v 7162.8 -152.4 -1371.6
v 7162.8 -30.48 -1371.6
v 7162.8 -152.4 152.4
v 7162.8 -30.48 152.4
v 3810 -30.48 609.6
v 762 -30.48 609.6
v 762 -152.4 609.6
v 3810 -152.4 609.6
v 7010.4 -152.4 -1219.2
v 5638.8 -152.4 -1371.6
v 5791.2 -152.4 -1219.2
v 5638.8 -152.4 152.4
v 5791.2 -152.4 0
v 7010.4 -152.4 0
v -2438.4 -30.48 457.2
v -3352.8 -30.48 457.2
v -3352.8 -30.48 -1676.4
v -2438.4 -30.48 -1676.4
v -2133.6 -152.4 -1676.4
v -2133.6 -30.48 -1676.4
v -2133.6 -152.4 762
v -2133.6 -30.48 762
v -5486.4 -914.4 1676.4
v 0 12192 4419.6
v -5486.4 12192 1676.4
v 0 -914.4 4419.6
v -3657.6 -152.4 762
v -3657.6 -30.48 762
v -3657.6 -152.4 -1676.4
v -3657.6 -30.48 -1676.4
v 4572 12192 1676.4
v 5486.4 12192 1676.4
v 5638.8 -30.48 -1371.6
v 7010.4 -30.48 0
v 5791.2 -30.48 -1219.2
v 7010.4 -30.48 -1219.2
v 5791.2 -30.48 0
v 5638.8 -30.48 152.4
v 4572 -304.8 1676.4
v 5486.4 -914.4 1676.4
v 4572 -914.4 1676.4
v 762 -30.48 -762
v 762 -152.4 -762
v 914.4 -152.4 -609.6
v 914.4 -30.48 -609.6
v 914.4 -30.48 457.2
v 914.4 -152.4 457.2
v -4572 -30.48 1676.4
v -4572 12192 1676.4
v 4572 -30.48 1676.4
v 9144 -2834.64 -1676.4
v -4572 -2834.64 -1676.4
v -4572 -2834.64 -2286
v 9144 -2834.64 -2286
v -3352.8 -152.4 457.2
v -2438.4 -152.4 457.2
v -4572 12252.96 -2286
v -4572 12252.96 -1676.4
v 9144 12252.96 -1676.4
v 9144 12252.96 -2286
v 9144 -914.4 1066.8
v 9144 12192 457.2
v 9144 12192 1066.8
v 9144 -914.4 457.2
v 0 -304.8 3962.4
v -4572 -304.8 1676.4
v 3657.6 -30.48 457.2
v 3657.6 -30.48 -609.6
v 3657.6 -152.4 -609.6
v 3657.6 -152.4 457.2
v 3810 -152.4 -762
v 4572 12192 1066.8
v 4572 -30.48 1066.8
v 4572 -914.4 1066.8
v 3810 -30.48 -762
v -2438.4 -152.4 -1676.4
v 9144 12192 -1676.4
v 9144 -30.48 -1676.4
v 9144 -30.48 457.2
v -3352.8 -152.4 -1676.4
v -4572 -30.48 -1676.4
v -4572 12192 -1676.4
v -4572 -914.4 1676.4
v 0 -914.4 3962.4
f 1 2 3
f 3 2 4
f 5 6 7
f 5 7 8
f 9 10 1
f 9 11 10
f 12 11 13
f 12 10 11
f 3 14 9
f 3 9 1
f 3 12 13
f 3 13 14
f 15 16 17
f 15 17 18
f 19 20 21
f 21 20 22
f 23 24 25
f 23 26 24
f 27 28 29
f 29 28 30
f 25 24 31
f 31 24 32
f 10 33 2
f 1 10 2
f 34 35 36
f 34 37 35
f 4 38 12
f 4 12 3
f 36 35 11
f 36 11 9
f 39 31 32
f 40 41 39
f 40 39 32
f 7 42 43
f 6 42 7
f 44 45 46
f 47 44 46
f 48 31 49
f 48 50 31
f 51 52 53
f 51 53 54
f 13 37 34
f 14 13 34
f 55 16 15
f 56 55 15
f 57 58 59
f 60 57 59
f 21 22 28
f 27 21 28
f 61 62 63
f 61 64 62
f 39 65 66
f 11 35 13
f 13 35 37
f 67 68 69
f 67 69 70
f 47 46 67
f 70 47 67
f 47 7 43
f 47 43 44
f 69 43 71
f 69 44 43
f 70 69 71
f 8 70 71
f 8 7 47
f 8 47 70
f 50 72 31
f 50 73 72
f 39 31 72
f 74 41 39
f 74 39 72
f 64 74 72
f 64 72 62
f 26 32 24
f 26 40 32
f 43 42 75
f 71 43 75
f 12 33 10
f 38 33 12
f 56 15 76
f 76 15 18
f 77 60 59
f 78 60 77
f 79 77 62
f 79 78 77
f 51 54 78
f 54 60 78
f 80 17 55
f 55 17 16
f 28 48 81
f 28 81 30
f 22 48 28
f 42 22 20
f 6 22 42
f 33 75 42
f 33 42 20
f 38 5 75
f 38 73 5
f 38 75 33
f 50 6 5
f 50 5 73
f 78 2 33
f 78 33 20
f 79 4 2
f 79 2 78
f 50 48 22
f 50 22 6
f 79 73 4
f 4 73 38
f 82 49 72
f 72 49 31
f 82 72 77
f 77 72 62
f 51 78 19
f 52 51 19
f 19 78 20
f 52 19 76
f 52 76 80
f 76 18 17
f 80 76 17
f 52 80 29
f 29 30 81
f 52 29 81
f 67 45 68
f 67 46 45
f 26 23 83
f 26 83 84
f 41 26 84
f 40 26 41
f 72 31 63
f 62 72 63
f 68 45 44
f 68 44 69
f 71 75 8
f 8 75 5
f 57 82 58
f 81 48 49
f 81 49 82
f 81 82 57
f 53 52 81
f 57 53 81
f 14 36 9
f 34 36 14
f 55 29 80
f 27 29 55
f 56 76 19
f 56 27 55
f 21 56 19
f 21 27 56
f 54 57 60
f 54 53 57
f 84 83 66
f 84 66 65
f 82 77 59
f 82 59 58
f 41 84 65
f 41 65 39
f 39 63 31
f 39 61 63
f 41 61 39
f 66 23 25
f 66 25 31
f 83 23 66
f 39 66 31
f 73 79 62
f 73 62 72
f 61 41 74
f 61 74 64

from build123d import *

# Parameters (mm, degrees)
F1_DEPTH      = 914.4
F1_DEPTH_BACK = 12192
F2_DEPTH      = 304.8
F2_DEPTH_BACK = 12192
F0_W          = 3048
F0_H          = 1371.6
F0_W_2        = 1524
F0_H_2        = 1524
F0_W_3        = 2743.2
F0_H_3        = 1066.8
F0_W_4        = 1219.2
F0_H_4        = 1219.2
F0_W_5        = 914.4
F0_H_5        = 2133.6
F3_DEPTH      = 30.48
F3_DEPTH_BACK = 12192
F4_DEPTH      = 152.4
F0_W_6        = 4572
F0_H_6        = 609.6
F5_DEPTH      = 2834.64
F5_DEPTH_BACK = 12252.96


# Not quite as in the source:
# - the program builds the solid bodies; features that only make, move or delete a surface that nothing else refers to are left out


with BuildPart() as f1:
    # F0 (on Front) → F1 (new body, two sides)
    with BuildSketch(Plane.XZ) as f1_sk:
        Polygon((-5486.4, 1676.4), (-4572, 1676.4), (0, 3962.4), (0, 4419.6), align=None)
        Polygon((0, 4419.6), (0, 3962.4), (4572, 1676.4), (5486.4, 1676.4), align=None)
    extrude(amount=F1_DEPTH)
    extrude(f1_sk.sketch, amount=-F1_DEPTH_BACK)



with BuildPart() as f1b:
    # F0 (on Front) → F1, piece 2 (new body, two sides)
    with BuildSketch(Plane.XZ) as f1_2_sk:
        Polygon((9144, 1066.8), (4572, 1676.4), (4572, 1066.8), (9144, 457.2), align=None)
    extrude(amount=F1_DEPTH)
    extrude(f1_2_sk.sketch, amount=-F1_DEPTH_BACK)


with BuildPart() as f1_1:
    add(f1.part)

    add(f1b.part)  # F2 merges F1b
    # F0 (on Front) → F2 (join, two sides)
    with BuildSketch(Plane.XZ) as f2_sk:
        Polygon((0, 3962.4), (-4572, 1676.4), (0, 1676.4), align=None)
        Polygon((0, 3962.4), (0, 1676.4), (4572, 1676.4), align=None)
    extrude(amount=F2_DEPTH)
    extrude(f2_sk.sketch, amount=-F2_DEPTH_BACK)


with BuildPart() as f3:
    # F0 (on Front) → F3 (new body, two sides)
    with BuildSketch(Plane.XZ) as f3_sk:
        Polygon((0, 1676.4), (-4572, 1676.4), (-4572, -1676.4), (-3657.6, -1676.4), (-3657.6, 762), (-2133.6, 762), (-2133.6, -1676.4), (4572, -1676.4), (4572, 1066.8), (4572, 1676.4), align=None)
        with Locations((2286, -76.2)):
            Rectangle(F0_W, F0_H, mode=Mode.SUBTRACT)
        Polygon((9144, 457.2), (4572, 1066.8), (4572, -1676.4), (9144, -1676.4), align=None)
        with Locations((6400.8, -609.6)):
            Rectangle(F0_W_2, F0_H_2, mode=Mode.SUBTRACT)
        with Locations((2286, -76.2)):
            Rectangle(F0_W, F0_H)
        with Locations((2286, -76.2)):
            Rectangle(F0_W_3, F0_H_3, mode=Mode.SUBTRACT)
        with Locations((2286, -76.2)):
            Rectangle(F0_W_3, F0_H_3)
        with Locations((6400.8, -609.6)):
            Rectangle(F0_W_2, F0_H_2)
        with Locations((6400.8, -609.6)):
            Rectangle(F0_W_4, F0_H_4, mode=Mode.SUBTRACT)
        with Locations((-2895.6, -609.6)):
            Rectangle(F0_W_5, F0_H_5)
        Polygon((-3657.6, 762), (-3657.6, -1676.4), (-3352.8, -1676.4), (-3352.8, 457.2), (-2438.4, 457.2), (-2438.4, -1676.4), (-2133.6, -1676.4), (-2133.6, 762), align=None)
        with Locations((6400.8, -609.6)):
            Rectangle(F0_W_4, F0_H_4)
    extrude(amount=F3_DEPTH)
    extrude(f3_sk.sketch, amount=-F3_DEPTH_BACK)

    # F0 (on Front) → F4 (join)
    with BuildSketch(Plane.XZ):
        Polygon((-3657.6, 762), (-3657.6, -1676.4), (-3352.8, -1676.4), (-3352.8, 457.2), (-2438.4, 457.2), (-2438.4, -1676.4), (-2133.6, -1676.4), (-2133.6, 762), align=None)
        with Locations((2286, -76.2)):
            Rectangle(F0_W, F0_H)
        with Locations((2286, -76.2)):
            Rectangle(F0_W_3, F0_H_3, mode=Mode.SUBTRACT)
        with Locations((6400.8, -609.6)):
            Rectangle(F0_W_2, F0_H_2)
        with Locations((6400.8, -609.6)):
            Rectangle(F0_W_4, F0_H_4, mode=Mode.SUBTRACT)
    extrude(amount=F4_DEPTH)

    # F0 (on Front) → F5 (join, two sides)
    with BuildSketch(Plane.XZ) as f5_sk:
        with Locations((6858, -1981.2)):
            Rectangle(F0_W_6, F0_H_6)
        Polygon((-3657.6, -1676.4), (-4572, -1676.4), (-4572, -2286), (4572, -2286), (4572, -1676.4), (-2133.6, -1676.4), (-2438.4, -1676.4), (-3352.8, -1676.4), align=None)
    extrude(amount=F5_DEPTH)
    extrude(f5_sk.sketch, amount=-F5_DEPTH_BACK)


solid = Compound([f1_1.part, f3.part])
